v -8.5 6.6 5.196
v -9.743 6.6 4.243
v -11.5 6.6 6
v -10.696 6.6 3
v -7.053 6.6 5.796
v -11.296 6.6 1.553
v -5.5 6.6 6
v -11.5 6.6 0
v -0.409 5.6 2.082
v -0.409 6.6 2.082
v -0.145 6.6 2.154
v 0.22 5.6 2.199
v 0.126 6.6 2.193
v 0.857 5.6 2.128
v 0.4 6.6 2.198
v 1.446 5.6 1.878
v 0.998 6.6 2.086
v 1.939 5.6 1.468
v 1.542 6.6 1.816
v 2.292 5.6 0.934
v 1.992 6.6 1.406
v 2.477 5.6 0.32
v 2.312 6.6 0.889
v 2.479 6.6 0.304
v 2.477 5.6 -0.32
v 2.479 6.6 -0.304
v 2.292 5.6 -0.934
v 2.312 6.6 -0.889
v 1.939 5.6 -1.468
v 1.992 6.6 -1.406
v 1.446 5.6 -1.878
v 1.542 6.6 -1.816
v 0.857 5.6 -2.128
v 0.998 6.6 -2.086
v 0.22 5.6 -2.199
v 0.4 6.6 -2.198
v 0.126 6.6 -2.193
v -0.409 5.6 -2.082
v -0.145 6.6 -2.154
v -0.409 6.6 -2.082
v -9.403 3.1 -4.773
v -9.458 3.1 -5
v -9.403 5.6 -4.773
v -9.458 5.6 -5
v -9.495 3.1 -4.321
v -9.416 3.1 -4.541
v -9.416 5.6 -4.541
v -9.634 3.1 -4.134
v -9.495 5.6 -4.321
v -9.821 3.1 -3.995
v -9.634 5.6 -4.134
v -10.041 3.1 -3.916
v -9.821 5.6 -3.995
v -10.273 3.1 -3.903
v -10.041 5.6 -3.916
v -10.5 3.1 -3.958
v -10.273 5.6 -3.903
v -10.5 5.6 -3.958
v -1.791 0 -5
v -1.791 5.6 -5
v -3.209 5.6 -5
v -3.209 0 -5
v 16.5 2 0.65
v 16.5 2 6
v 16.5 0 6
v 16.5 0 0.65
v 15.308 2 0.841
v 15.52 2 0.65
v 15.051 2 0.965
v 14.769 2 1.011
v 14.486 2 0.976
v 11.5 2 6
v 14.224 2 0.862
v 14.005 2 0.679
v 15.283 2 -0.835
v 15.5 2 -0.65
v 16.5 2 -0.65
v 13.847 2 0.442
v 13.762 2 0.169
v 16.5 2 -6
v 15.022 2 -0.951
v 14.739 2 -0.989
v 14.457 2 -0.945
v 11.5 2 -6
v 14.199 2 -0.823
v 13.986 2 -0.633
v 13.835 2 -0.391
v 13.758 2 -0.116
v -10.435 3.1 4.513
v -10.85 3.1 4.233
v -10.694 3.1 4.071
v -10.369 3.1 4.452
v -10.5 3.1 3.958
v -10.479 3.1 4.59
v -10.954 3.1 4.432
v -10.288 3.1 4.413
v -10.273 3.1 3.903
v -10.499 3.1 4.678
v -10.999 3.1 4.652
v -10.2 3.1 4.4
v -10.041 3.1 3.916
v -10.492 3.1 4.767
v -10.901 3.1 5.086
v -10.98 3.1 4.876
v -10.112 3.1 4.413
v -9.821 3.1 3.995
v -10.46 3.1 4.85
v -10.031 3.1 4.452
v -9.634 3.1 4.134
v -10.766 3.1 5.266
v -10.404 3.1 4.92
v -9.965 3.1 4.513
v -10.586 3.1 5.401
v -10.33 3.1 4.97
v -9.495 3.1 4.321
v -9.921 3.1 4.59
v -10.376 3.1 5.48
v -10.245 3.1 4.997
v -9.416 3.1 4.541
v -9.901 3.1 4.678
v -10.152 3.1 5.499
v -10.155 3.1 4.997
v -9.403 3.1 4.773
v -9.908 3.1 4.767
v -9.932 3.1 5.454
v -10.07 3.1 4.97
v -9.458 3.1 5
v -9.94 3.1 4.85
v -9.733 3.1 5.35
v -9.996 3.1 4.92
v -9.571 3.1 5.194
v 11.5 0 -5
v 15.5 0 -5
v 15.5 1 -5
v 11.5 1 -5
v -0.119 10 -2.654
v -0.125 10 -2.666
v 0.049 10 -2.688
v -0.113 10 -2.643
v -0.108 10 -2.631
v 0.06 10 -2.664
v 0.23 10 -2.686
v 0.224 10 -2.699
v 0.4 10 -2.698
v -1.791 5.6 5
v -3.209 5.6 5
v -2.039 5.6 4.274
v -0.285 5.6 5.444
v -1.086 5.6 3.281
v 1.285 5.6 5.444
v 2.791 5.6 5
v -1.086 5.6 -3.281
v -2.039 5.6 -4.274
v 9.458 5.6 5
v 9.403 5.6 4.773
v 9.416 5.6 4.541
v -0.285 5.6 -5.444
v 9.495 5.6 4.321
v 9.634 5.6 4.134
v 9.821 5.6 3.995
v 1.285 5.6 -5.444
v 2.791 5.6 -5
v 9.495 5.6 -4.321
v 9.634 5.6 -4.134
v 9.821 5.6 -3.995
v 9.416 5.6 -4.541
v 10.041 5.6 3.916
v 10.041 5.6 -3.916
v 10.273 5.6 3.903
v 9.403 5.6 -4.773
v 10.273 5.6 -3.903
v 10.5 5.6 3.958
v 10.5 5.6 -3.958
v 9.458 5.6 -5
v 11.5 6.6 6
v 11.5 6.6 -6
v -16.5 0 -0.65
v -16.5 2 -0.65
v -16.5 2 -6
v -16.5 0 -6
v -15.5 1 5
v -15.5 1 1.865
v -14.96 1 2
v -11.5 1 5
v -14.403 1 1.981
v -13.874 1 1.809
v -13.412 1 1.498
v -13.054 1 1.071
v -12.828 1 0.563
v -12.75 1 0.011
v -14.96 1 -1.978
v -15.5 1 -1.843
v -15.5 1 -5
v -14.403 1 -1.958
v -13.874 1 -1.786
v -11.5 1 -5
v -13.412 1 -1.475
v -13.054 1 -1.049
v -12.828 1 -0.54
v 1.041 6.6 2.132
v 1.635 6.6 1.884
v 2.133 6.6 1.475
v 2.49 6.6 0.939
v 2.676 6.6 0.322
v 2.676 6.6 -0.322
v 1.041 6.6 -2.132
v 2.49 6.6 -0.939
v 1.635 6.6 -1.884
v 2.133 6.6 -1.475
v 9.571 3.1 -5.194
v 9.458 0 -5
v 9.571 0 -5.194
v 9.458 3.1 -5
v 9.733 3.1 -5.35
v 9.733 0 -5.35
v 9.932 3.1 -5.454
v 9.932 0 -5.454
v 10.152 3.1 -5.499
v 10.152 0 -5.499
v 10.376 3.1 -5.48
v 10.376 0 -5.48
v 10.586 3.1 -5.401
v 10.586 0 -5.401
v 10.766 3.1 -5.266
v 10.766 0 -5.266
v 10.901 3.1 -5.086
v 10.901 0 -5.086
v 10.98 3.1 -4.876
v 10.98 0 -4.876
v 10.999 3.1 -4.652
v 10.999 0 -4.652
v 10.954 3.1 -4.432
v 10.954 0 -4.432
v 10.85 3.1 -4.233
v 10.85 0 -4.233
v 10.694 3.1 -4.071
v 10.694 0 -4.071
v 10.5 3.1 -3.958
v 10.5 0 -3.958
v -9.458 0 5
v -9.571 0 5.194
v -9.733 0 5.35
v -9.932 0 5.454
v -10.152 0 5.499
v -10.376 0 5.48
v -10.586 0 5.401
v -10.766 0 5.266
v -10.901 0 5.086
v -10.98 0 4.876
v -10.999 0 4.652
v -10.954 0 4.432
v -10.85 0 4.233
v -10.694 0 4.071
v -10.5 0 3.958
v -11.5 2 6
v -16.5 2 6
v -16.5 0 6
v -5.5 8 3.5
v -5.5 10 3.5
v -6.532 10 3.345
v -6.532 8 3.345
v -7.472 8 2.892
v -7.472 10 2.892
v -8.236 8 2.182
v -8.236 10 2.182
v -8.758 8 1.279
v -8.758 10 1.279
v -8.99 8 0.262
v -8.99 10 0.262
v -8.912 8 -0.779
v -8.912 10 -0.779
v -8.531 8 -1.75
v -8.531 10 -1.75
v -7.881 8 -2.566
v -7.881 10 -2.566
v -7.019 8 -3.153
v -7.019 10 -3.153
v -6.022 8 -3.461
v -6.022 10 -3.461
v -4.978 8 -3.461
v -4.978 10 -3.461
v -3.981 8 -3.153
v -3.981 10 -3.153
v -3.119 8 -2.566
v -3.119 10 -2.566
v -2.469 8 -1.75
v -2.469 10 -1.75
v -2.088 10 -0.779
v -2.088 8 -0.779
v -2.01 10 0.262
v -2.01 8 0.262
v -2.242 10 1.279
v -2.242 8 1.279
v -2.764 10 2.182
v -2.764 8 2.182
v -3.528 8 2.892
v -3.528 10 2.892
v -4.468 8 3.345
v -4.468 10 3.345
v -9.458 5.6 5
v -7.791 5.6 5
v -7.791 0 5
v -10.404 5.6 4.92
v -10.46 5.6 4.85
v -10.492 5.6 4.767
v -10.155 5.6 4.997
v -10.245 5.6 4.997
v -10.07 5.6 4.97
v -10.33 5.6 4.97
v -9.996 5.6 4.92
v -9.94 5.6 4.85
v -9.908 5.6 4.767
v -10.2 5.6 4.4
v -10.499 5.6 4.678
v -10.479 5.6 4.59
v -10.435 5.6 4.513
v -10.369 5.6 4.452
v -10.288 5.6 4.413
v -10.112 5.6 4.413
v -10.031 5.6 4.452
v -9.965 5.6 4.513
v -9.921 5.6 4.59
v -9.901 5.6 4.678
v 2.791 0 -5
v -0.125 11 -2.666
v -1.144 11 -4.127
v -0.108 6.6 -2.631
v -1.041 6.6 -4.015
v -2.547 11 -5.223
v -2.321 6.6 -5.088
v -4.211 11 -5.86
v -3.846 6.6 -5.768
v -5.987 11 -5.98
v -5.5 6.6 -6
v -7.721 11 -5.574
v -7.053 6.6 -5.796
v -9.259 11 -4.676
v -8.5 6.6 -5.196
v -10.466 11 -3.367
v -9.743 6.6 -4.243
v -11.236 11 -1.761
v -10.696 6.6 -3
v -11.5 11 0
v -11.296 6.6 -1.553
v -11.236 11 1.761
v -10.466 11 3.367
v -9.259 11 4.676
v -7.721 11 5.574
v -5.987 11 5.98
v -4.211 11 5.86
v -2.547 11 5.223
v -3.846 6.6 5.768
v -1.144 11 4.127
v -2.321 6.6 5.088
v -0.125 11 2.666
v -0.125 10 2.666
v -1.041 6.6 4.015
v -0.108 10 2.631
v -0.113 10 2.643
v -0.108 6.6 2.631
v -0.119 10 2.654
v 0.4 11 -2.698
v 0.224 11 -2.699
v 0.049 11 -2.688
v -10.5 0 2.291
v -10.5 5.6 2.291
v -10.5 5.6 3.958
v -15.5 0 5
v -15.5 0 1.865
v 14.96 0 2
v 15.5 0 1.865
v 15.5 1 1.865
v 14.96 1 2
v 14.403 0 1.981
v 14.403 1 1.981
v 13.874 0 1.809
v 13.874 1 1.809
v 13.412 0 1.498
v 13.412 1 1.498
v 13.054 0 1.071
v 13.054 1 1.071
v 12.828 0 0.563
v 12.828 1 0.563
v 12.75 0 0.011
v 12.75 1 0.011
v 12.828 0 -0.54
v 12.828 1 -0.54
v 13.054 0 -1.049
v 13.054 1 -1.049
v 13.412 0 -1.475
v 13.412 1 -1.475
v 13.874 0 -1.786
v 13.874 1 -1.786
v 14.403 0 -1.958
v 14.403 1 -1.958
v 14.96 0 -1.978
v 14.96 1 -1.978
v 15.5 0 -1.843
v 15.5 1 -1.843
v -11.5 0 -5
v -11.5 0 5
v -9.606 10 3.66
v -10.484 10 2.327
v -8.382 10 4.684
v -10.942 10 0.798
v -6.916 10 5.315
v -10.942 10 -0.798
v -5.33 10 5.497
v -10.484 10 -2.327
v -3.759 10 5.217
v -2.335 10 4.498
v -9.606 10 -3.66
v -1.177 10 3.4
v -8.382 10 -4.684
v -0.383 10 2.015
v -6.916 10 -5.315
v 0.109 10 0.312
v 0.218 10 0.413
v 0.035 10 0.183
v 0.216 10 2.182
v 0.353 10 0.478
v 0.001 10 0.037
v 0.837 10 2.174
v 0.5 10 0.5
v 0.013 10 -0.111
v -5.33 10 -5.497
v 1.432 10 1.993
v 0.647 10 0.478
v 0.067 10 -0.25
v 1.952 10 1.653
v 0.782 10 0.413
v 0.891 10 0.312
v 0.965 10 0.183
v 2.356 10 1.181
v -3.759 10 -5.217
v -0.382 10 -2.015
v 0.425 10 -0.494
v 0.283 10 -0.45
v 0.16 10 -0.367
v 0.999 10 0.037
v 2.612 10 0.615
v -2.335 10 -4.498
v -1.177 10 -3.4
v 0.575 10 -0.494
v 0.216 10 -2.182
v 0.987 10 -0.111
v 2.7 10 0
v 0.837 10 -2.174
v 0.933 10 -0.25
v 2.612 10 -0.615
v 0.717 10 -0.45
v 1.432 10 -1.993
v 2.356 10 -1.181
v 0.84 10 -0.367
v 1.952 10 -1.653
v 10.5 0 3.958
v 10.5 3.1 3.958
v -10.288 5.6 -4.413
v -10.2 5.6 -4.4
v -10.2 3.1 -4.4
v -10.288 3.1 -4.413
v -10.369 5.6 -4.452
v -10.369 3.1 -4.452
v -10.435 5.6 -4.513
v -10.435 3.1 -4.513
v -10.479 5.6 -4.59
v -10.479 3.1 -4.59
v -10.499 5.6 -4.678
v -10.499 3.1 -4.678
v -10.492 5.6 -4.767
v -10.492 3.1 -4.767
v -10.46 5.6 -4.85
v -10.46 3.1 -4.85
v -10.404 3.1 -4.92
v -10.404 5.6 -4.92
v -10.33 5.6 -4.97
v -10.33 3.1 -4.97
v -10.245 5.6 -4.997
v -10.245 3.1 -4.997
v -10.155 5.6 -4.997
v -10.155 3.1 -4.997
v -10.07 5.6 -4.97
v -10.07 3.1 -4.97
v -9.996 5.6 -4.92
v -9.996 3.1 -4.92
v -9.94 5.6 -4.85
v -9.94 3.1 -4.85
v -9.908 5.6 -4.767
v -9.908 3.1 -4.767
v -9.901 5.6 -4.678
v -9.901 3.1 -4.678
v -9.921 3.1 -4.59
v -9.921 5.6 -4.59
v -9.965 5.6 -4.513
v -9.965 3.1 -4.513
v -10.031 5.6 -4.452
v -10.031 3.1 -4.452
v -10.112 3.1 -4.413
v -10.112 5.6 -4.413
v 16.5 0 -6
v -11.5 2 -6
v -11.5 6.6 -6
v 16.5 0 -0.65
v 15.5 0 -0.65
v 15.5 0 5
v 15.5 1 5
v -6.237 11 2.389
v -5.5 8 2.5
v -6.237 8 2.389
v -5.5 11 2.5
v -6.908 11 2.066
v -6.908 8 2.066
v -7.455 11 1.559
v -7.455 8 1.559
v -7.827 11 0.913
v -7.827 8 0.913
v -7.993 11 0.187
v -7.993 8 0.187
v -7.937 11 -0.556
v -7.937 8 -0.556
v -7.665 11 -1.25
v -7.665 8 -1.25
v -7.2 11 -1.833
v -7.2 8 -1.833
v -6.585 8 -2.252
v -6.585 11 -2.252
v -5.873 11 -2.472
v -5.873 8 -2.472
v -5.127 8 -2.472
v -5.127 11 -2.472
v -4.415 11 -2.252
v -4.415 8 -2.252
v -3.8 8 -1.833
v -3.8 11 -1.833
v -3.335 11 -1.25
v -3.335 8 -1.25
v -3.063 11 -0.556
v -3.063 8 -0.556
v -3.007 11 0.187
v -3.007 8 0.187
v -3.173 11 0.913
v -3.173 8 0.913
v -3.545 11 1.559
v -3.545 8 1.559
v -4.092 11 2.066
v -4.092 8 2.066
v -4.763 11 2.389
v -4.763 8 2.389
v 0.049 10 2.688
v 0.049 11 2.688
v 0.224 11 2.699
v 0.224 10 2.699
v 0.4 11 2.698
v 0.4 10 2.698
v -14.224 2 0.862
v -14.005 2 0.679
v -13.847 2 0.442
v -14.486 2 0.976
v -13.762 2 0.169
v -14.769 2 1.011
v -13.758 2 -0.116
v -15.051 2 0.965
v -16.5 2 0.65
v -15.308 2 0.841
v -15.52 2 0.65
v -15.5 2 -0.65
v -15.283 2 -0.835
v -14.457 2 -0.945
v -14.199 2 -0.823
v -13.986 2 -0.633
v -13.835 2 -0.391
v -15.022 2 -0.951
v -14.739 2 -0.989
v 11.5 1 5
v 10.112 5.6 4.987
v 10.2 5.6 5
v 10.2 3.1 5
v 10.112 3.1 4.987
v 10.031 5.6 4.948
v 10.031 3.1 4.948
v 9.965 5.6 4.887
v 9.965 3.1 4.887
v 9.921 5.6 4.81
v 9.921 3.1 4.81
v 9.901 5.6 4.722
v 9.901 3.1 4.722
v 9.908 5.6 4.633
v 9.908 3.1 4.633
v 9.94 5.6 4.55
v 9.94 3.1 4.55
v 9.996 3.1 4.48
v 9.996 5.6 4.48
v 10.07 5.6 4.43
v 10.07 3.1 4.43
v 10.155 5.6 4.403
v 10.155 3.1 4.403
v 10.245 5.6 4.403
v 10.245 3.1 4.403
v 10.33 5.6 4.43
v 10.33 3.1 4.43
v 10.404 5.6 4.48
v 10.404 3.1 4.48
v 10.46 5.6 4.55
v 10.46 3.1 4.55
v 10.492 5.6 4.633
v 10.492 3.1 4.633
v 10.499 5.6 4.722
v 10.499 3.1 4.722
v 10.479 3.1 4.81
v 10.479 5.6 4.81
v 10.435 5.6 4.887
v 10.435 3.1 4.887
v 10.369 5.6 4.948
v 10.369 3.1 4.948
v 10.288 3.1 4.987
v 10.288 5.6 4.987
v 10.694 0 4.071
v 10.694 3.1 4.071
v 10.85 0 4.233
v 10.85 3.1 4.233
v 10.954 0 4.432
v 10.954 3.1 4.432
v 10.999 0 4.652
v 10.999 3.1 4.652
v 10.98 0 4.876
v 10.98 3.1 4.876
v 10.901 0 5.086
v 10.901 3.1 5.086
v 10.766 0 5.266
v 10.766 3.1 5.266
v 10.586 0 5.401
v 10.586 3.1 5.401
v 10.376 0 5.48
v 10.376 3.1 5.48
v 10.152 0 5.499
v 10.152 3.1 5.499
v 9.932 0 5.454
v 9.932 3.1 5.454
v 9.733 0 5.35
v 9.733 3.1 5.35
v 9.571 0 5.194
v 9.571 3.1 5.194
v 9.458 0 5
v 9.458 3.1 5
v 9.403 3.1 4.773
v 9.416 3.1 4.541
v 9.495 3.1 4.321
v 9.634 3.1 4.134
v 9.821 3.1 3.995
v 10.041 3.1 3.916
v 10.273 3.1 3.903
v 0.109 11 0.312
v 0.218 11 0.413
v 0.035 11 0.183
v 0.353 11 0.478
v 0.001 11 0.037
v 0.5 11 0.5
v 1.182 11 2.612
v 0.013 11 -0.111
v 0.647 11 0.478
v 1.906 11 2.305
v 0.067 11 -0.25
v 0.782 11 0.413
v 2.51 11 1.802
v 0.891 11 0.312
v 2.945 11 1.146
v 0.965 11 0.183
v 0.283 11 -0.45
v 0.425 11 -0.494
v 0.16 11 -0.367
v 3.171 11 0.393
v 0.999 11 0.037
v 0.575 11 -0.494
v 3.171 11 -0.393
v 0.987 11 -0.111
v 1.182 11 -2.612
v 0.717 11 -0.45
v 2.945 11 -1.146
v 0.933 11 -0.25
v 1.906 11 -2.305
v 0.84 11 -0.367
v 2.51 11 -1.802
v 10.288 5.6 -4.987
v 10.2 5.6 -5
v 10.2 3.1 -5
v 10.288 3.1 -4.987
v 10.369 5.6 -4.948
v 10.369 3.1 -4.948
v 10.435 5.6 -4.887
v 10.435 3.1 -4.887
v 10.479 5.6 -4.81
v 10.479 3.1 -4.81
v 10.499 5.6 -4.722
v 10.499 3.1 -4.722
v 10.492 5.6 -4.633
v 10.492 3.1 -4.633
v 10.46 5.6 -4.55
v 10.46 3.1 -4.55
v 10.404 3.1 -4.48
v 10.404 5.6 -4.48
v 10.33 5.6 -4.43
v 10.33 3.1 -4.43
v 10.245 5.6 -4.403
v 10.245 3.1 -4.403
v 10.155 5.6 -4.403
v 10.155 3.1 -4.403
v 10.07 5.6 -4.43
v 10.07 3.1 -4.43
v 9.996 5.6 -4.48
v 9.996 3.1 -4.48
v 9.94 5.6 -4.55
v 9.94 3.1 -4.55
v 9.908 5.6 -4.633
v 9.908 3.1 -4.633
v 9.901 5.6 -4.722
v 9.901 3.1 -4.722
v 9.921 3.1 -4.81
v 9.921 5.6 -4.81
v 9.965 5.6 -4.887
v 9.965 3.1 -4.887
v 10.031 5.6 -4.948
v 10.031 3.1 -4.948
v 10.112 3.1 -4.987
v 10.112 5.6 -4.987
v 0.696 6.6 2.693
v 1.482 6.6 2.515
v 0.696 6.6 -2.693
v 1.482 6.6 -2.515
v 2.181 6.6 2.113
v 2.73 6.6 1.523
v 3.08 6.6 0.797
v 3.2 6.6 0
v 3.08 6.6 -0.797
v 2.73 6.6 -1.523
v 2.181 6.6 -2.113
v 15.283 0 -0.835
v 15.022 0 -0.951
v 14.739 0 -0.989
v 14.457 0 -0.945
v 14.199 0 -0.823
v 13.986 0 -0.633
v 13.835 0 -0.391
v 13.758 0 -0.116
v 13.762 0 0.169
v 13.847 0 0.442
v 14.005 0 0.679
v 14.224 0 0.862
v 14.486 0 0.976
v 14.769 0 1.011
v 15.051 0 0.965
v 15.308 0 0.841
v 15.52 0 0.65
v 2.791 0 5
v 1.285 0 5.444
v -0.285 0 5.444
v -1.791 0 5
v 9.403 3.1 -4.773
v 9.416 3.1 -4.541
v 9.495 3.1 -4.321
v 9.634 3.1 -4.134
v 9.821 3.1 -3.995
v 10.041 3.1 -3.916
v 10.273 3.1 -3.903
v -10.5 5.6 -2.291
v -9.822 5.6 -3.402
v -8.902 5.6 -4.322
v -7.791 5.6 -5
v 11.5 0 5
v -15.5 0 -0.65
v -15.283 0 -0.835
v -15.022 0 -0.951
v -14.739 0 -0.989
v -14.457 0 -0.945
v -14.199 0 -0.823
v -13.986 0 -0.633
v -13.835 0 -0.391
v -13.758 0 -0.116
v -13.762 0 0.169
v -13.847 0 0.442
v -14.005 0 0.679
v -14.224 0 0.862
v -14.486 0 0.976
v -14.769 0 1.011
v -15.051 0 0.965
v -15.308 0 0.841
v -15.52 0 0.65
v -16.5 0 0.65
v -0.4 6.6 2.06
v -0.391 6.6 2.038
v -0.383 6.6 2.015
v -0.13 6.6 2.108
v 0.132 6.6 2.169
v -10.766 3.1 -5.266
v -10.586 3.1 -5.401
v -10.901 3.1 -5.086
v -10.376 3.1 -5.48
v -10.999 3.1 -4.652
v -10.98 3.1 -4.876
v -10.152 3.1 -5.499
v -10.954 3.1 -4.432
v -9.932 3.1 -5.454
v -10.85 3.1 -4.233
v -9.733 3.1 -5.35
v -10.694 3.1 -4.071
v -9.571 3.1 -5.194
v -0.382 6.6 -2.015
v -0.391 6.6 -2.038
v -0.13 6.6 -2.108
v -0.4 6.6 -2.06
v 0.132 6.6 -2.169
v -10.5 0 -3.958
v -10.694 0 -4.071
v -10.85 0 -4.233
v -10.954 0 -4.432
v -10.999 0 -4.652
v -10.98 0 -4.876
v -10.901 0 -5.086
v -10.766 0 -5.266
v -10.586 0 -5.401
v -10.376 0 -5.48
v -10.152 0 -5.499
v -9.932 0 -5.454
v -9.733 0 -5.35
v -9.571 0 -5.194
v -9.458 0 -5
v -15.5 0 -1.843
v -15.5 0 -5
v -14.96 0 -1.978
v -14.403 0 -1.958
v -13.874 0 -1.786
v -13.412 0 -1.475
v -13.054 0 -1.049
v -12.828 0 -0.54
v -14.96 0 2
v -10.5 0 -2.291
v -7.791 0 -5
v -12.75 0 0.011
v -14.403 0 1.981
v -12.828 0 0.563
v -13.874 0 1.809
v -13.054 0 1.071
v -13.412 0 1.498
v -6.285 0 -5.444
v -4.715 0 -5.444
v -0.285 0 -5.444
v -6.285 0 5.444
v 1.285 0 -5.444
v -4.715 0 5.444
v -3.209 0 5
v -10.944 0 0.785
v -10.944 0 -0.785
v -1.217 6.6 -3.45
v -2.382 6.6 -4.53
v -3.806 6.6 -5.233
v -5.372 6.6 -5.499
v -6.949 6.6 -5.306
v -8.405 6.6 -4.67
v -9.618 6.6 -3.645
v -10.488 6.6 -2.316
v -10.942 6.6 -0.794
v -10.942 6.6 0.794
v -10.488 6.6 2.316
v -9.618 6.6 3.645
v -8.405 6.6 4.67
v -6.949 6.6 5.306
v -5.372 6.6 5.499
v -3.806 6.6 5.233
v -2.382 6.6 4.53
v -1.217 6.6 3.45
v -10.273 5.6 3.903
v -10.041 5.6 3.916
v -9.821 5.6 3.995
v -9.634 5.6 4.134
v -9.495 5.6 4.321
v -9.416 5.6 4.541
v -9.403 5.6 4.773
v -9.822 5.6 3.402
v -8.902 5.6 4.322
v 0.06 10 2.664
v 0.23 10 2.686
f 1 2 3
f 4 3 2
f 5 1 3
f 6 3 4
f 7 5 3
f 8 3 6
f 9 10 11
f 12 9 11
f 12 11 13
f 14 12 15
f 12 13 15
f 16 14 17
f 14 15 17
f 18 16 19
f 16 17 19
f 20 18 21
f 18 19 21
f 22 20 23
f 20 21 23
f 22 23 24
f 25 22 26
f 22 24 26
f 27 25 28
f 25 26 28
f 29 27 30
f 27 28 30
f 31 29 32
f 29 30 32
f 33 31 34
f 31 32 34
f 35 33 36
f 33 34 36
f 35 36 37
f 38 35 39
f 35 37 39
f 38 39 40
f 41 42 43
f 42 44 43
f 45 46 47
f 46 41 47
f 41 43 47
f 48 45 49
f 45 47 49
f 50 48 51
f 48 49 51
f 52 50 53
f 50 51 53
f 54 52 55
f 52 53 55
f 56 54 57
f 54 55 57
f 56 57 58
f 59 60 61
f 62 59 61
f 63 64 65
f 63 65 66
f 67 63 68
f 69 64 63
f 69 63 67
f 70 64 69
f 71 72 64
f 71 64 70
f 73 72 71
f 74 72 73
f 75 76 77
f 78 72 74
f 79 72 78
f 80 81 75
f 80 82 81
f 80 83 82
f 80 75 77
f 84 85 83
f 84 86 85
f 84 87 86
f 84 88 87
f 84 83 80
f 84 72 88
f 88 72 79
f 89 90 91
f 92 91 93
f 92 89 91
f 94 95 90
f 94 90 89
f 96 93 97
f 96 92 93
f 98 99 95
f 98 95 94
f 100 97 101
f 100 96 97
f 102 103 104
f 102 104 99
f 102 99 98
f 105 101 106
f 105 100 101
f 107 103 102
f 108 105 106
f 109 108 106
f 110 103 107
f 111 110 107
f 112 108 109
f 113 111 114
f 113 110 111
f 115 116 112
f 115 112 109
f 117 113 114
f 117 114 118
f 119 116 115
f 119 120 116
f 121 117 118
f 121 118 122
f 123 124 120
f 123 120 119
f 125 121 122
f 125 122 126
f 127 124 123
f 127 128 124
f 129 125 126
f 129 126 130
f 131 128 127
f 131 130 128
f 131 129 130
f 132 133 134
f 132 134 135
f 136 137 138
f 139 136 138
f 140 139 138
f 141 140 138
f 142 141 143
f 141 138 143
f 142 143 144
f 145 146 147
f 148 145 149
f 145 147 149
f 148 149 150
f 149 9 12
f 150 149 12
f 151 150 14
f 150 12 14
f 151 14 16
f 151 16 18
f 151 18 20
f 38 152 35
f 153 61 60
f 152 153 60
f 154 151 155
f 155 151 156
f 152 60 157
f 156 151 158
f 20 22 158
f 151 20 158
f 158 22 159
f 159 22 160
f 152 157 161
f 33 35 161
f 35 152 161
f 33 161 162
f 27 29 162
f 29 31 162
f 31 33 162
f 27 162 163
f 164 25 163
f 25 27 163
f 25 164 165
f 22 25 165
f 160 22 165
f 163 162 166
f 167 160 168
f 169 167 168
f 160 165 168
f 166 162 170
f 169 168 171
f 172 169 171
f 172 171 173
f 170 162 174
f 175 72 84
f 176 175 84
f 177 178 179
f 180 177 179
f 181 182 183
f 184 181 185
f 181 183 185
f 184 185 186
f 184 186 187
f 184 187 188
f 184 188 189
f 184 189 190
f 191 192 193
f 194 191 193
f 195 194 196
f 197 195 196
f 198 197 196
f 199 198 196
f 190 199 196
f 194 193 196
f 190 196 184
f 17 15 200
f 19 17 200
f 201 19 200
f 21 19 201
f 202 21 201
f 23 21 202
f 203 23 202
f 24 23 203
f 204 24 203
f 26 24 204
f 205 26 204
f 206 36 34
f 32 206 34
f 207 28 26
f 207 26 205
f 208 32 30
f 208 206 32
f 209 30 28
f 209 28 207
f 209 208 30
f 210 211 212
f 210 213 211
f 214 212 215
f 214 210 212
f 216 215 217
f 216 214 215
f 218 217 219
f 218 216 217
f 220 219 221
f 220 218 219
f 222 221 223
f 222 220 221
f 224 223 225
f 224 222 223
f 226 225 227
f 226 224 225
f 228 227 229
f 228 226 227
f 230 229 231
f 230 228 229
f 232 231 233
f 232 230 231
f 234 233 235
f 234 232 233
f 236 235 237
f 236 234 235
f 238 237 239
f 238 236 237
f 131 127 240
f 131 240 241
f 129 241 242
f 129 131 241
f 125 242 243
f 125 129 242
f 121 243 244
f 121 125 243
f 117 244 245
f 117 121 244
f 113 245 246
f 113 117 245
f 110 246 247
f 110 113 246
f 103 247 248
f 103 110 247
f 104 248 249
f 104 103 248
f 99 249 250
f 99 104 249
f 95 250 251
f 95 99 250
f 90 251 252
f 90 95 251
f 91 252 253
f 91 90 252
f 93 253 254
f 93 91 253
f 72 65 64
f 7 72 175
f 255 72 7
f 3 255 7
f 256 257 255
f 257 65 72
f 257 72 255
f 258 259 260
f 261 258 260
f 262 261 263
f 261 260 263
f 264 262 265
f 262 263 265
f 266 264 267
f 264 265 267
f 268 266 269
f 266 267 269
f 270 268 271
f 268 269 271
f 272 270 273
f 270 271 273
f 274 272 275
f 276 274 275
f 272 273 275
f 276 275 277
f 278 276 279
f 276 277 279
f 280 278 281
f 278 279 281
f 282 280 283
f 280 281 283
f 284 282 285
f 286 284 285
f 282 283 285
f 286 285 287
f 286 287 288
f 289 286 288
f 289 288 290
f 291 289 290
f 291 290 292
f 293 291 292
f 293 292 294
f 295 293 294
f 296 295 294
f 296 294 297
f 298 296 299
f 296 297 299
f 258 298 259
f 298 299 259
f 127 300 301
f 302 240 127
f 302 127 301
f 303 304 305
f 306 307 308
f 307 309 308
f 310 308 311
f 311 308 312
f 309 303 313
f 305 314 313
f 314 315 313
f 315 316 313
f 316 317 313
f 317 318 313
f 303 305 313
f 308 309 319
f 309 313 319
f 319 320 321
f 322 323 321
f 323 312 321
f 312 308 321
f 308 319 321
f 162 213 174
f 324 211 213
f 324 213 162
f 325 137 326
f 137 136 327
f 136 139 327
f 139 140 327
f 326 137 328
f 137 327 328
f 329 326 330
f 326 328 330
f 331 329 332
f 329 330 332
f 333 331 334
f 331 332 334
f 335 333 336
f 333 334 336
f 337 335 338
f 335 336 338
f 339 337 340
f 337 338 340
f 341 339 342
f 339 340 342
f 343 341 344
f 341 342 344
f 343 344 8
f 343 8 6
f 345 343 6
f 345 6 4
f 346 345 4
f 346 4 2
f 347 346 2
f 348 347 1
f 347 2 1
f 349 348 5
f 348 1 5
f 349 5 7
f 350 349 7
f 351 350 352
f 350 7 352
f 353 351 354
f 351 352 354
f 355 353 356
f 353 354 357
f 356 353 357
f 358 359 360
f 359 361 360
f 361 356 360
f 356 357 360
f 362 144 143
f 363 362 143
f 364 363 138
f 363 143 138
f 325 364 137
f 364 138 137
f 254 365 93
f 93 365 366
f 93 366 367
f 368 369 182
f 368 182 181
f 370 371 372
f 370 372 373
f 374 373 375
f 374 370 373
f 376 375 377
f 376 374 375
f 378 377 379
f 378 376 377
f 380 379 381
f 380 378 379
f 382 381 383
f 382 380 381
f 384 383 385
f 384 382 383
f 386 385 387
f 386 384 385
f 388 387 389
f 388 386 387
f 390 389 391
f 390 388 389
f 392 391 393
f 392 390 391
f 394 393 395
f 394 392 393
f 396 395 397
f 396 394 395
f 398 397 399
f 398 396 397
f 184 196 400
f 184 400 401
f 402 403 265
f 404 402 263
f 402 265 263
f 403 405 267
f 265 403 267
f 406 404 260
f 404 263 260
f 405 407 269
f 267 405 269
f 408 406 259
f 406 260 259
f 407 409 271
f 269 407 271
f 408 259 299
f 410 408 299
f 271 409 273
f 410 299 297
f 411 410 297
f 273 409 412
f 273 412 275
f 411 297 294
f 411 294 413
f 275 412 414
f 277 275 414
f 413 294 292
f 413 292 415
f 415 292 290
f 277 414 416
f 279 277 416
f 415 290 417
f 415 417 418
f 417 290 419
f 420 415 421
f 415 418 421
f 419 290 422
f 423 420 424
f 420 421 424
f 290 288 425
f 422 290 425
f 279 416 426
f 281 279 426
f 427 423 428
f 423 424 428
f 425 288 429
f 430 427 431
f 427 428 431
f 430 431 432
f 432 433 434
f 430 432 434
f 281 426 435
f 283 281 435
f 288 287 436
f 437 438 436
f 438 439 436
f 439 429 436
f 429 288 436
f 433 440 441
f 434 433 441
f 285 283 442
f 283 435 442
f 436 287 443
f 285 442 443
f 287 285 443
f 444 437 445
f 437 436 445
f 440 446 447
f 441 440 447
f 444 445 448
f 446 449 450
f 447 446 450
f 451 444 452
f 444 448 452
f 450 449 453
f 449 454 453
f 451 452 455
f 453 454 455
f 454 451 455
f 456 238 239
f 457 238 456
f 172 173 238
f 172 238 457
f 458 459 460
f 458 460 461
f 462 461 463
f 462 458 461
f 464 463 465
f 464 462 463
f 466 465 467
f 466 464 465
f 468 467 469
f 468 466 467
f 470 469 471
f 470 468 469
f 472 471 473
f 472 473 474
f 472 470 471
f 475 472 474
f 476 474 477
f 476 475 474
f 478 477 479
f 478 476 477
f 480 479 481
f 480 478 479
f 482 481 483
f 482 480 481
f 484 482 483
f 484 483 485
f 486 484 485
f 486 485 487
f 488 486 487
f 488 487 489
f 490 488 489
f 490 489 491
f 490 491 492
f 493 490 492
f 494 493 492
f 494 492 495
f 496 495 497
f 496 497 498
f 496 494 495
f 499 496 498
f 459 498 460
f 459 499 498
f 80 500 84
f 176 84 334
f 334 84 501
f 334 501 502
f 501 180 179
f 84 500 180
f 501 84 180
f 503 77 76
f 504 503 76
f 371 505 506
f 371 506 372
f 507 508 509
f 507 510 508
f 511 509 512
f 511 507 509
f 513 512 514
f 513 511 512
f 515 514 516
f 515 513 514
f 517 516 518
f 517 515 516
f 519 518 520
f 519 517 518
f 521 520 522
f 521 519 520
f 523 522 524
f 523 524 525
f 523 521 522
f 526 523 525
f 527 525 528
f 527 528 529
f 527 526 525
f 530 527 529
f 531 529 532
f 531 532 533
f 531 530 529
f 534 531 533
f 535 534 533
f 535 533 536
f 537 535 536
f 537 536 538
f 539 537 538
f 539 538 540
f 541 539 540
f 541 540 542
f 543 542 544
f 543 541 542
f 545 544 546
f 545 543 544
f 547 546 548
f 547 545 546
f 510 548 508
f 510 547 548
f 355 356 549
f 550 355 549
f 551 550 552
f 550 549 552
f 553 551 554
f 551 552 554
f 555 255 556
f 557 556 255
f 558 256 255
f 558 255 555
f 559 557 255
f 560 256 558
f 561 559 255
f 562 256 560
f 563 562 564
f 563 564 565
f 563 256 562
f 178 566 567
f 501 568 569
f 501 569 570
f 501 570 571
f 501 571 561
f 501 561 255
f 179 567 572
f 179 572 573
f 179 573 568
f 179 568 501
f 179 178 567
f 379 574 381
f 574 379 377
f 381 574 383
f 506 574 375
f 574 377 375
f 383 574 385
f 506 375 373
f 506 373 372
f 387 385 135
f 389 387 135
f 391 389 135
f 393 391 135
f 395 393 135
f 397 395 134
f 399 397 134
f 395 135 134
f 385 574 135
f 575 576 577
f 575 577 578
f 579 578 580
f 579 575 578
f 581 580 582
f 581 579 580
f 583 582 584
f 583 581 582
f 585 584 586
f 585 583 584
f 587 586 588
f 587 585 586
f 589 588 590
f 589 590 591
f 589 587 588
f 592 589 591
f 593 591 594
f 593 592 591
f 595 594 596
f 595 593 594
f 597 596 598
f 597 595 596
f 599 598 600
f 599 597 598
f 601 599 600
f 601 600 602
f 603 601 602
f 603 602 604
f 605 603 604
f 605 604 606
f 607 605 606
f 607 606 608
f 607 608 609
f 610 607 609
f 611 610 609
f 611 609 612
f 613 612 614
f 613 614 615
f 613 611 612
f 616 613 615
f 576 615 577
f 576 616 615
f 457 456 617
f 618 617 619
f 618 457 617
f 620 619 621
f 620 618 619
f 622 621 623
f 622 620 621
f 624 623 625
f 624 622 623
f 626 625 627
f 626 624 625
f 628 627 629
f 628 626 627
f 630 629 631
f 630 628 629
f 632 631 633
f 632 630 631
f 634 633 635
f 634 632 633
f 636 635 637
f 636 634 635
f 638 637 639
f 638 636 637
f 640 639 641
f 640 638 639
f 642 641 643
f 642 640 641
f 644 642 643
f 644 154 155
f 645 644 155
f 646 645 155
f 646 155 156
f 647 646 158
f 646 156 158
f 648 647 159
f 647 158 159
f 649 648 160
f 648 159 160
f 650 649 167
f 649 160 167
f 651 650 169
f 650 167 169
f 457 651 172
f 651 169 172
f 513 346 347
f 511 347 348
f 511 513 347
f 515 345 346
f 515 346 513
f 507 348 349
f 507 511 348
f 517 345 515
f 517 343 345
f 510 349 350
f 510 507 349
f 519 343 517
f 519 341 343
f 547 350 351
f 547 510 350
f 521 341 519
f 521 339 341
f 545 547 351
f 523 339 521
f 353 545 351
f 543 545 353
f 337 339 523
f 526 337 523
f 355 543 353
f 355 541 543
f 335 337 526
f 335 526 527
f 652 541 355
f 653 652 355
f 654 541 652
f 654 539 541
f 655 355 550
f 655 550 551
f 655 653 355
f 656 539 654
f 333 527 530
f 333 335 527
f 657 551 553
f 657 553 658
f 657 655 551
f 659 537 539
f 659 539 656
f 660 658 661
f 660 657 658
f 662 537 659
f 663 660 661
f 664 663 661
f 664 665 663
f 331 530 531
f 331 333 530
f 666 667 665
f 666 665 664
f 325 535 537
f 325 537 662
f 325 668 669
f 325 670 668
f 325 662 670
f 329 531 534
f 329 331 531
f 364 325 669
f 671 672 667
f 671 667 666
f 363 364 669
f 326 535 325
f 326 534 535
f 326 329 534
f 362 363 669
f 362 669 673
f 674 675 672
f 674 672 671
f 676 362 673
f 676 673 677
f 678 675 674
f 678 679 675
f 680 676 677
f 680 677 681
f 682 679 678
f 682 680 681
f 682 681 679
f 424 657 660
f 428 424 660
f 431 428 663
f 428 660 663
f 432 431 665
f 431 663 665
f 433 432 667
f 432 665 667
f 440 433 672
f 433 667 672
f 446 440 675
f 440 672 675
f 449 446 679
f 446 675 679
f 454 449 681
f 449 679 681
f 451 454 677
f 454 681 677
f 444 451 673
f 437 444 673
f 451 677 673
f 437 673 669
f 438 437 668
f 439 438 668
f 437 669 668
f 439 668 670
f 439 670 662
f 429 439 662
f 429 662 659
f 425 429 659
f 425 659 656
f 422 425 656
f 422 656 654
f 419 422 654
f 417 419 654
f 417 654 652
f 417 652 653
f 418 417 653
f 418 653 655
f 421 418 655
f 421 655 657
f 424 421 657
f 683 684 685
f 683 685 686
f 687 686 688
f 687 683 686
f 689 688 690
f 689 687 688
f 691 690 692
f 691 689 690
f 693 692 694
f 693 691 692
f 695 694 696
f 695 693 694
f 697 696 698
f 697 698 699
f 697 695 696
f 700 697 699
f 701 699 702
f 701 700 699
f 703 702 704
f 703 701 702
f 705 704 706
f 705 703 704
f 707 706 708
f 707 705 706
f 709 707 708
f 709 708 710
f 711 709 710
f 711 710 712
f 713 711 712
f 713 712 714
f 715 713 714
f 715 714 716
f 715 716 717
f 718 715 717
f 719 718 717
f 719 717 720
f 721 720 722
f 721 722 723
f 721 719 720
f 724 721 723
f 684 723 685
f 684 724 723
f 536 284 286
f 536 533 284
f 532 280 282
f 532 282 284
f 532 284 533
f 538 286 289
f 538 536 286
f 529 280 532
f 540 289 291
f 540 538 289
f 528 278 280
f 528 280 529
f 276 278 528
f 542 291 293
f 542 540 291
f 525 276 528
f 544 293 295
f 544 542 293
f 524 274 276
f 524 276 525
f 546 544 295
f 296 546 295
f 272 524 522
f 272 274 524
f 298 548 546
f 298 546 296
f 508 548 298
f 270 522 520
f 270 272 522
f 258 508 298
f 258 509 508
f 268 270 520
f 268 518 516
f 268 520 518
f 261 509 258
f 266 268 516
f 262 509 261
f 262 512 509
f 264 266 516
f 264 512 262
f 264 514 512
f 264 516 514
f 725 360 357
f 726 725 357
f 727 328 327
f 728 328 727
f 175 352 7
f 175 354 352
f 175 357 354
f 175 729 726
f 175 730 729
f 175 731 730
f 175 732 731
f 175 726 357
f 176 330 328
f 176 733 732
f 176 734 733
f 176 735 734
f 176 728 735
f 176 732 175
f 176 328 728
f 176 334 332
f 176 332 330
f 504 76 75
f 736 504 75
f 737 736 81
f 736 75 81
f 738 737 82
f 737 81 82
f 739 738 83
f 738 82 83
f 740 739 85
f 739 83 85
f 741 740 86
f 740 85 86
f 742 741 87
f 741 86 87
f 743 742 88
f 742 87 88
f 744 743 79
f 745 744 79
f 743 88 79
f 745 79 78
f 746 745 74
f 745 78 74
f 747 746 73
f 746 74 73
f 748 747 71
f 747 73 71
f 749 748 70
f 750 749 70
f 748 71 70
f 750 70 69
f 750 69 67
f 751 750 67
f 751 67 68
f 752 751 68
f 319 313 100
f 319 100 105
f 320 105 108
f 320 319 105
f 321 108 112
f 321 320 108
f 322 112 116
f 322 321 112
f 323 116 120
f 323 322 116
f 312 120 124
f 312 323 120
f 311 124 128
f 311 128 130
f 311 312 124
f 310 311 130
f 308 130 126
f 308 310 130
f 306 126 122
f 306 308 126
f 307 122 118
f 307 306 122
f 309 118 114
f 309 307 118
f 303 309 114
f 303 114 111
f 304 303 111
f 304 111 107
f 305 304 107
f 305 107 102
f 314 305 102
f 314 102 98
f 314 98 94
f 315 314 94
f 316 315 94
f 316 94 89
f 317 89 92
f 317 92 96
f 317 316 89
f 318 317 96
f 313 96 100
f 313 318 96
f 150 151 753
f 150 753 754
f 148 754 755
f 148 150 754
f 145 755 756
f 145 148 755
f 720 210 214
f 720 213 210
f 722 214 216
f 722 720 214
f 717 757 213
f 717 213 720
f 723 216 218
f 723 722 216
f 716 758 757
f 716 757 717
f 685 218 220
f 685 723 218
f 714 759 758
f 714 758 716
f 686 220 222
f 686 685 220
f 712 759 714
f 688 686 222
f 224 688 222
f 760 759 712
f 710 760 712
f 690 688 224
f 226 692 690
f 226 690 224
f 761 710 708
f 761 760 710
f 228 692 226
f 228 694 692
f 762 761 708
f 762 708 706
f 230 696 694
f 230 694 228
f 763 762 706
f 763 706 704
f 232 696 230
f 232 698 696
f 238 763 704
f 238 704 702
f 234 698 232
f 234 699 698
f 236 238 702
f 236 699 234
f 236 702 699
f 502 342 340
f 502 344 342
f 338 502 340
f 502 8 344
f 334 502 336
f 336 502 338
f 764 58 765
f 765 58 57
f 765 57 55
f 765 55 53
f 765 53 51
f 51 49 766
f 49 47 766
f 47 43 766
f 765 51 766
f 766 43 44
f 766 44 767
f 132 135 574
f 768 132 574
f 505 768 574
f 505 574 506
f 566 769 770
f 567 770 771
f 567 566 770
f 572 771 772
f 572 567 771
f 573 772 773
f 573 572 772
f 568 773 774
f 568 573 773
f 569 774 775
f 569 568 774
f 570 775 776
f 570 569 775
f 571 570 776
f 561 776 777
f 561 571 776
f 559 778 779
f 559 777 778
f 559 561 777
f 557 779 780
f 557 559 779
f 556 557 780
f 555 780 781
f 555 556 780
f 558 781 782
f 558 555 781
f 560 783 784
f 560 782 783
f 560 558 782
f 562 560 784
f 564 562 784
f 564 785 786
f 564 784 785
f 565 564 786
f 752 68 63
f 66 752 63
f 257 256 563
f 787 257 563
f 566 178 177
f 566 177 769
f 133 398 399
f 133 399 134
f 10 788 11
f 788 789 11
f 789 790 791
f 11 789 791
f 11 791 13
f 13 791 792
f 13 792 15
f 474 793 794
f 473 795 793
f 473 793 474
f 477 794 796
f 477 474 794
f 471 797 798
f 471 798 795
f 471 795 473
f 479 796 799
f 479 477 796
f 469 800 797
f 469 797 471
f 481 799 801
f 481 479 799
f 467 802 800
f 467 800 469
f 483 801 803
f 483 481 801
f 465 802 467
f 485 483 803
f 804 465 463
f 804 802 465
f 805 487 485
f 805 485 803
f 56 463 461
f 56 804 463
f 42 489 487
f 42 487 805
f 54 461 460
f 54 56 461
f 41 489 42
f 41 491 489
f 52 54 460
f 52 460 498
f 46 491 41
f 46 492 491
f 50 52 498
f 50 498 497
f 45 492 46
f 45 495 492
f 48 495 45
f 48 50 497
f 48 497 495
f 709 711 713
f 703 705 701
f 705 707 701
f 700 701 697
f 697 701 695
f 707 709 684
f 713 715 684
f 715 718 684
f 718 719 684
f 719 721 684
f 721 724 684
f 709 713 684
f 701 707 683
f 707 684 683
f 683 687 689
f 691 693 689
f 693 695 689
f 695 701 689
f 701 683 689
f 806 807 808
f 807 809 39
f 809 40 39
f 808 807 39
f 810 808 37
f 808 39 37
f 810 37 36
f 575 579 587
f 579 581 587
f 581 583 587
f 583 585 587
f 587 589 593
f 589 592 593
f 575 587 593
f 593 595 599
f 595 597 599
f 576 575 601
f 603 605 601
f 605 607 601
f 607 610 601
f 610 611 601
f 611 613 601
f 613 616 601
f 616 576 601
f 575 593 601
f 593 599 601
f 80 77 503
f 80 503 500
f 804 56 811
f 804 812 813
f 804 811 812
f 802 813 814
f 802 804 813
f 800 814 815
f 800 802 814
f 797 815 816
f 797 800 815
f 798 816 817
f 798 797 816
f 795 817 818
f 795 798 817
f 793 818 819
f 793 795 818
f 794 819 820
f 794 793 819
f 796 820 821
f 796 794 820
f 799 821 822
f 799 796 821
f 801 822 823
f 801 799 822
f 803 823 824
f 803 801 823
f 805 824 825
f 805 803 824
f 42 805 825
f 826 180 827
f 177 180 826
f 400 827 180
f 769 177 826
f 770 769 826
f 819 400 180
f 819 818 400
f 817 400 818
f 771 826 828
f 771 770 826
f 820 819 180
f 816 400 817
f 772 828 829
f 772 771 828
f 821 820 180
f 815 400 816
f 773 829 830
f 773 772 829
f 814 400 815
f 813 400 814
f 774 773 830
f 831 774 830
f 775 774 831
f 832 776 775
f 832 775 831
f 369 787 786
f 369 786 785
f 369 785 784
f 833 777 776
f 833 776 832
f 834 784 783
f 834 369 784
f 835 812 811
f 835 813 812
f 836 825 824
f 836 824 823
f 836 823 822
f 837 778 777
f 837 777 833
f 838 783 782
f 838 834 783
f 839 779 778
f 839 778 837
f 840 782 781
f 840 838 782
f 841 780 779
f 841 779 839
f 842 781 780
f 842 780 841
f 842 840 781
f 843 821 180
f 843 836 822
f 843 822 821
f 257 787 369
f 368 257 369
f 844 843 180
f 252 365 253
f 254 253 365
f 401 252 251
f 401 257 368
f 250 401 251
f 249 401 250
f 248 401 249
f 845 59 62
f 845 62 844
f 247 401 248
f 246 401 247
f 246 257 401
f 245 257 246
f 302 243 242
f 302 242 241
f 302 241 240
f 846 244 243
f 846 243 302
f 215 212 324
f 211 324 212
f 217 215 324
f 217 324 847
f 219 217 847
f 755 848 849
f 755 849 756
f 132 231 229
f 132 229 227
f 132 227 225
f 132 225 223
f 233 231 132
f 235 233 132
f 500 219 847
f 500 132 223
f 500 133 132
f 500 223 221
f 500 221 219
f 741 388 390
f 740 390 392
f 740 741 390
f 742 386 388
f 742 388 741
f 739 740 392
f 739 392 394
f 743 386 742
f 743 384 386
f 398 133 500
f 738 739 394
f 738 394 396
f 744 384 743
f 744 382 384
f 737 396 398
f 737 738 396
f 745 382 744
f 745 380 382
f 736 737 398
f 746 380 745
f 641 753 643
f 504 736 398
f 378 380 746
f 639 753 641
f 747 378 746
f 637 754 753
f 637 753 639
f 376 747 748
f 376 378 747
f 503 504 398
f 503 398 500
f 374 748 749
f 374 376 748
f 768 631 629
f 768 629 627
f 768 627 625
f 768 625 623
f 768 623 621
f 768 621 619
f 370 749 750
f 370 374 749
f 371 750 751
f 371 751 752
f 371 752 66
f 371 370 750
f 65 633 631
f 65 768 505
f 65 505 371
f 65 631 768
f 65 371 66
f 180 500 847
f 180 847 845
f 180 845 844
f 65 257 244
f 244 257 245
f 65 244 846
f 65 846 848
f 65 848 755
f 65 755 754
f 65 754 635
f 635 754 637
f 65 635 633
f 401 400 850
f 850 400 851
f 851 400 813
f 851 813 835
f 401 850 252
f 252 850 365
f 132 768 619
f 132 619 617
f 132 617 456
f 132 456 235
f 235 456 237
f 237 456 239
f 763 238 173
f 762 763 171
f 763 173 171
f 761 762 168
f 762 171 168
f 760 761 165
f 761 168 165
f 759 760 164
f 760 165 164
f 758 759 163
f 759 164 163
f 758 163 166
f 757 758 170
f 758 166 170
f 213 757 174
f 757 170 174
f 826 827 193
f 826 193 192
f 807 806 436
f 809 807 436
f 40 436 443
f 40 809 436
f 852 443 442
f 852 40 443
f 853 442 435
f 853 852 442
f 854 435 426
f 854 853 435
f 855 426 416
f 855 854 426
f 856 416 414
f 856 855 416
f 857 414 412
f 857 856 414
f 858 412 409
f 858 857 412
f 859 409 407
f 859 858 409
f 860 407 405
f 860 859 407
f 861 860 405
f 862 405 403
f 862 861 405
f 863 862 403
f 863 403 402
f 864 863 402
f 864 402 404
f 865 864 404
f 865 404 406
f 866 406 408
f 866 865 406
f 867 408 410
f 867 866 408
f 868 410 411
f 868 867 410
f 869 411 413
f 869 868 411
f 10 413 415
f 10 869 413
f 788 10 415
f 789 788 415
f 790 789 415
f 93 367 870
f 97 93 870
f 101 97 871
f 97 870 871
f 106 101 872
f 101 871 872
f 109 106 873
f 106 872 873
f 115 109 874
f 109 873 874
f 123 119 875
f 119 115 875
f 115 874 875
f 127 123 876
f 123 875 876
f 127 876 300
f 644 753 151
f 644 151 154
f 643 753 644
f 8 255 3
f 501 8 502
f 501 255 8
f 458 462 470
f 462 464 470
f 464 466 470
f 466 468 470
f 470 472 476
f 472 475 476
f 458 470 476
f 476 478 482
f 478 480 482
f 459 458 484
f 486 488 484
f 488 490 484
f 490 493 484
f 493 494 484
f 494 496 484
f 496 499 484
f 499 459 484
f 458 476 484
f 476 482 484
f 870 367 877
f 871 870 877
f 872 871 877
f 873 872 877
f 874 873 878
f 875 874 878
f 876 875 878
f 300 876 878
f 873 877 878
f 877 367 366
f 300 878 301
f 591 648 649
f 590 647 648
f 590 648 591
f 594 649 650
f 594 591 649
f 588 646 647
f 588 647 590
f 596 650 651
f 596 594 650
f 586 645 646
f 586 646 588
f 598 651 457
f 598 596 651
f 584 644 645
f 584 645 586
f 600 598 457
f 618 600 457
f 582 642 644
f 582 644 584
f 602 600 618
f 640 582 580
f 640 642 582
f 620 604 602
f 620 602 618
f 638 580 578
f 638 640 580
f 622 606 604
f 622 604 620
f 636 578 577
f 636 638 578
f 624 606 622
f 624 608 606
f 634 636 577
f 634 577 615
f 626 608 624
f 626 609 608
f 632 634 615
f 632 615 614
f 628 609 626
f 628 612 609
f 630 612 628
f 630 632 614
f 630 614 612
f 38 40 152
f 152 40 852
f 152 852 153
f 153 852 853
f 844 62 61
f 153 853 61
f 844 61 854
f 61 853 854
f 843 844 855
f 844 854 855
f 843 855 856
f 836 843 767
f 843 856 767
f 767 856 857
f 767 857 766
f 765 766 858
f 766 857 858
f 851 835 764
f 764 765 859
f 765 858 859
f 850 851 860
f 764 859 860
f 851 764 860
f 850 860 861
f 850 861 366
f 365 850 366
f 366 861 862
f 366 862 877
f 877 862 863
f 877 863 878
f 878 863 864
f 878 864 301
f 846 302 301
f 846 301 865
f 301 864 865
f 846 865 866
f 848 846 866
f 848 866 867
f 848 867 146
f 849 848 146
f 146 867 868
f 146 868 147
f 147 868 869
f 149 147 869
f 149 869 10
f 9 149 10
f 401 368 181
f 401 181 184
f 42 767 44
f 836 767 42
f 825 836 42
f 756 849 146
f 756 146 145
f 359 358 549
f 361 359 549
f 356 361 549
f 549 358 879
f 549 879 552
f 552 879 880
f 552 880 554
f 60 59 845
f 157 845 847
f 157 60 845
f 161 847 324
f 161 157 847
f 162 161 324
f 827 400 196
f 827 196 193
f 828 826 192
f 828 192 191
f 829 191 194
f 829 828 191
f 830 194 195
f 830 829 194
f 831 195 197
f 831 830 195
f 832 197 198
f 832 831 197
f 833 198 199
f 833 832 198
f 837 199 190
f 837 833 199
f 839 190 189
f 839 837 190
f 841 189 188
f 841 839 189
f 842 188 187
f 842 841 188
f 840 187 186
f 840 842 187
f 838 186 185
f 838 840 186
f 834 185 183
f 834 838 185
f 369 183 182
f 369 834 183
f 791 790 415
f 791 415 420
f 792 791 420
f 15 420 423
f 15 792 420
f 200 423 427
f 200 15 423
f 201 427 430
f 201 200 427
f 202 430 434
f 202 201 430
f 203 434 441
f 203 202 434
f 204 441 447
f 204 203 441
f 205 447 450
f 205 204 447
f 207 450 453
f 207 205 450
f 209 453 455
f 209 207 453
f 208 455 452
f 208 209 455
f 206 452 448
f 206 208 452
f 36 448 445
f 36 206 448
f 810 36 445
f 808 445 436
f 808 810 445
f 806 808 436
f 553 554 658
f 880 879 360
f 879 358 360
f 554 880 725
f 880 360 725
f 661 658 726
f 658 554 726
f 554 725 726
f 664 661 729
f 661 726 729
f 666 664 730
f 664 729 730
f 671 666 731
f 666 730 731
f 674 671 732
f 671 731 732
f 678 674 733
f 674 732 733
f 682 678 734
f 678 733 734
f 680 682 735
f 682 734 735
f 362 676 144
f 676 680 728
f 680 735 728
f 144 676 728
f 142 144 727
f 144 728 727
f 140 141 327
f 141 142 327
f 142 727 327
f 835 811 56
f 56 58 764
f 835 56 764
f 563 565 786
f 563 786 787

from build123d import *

# Parameters (mm, degrees)
SKETCH1_W                = 23
SKETCH1_H                = 12
BOSS_EXTRUDE1_DEPTH      = 6.6
BOSS_EXTRUDE2_DEPTH      = 5
BOSS_EXTRUDE2_DEPTH_BACK = 28
SKETCH2_W                = 12
SKETCH2_H                = 2
CUT_EXTRUDE1_DEPTH       = 5
SHELL3_OUTLINE_W         = 21
SHELL3_OUTLINE_H         = 10
SHELL3_DEPTH             = 5.6
SHELL3_2_DEPTH           = 1
SKETCH5_W                = 1
SKETCH5_H                = 10
BOSS_EXTRUDE4_DEPTH      = 1
SKETCH5_3_W              = 1
SKETCH5_3_H              = 10
BOSS_EXTRUDE5_DEPTH      = 1
BOSS_EXTRUDE6_DEPTH      = 4.4
CUT_EXTRUDE2_DEPTH       = 19.756598839
BOSS_EXTRUDE7_START      = -1
BOSS_EXTRUDE7_DEPTH      = 1
SKETCH21_R               = 2.5
SKETCH21_R_2             = 0.5
CUT_EXTRUDE3_DEPTH       = 21.718349355
SKETCH22_R               = 5.5
SKETCH22_R_2             = 0.8
CUT_EXTRUDE4_DEPTH       = 19.42851052
SKETCH23_R               = 0.8
SKETCH23_R_2             = 0.3
BOSS_EXTRUDE9_DEPTH      = 2.5
SKETCH25_R               = 3.5
SKETCH25_R_2             = 2.5
BOSS_EXTRUDE10_DEPTH     = 2


# Read off the part's stored shape, not the designer's step: Shell3
with BuildPart() as part:
    # Sketch1 → Boss-Extrude1 (new body)
    with BuildSketch(Plane(origin=(0, 0, 0), x_dir=(1, 0, 0), z_dir=(0, 1, 0))):
        Rectangle(SKETCH1_W, SKETCH1_H)
    extrude(amount=BOSS_EXTRUDE1_DEPTH)

    # Sketch2 → Boss-Extrude2 (add, two sides: drawn at the far end of the back side and taken through both)
    with BuildSketch(Plane(origin=(11.5, 0, 0), x_dir=(0, 0, -1), z_dir=(1, 0, 0)).offset(-BOSS_EXTRUDE2_DEPTH_BACK)):
        with Locations((0, 1)):
            Rectangle(SKETCH2_W, SKETCH2_H)
    extrude(amount=BOSS_EXTRUDE2_DEPTH + BOSS_EXTRUDE2_DEPTH_BACK)

    # Sketch3 → Cut-Extrude1 (cut)
    with BuildSketch(Plane(origin=(0, 2, 0), x_dir=(1, 0, 0), z_dir=(0, 1, 0))):
        with BuildLine():
            Line((16.5, 0.65), (15.5, 0.65))
            ThreePointArc((15.5, 0.65), (13.750113293, -0.026490152), (15.519570239, -0.65))
            Line((15.519570239, -0.65), (16.5, -0.65))
            Line((16.5, -0.65), (16.5, 0.65))
        make_face()
        with BuildLine():
            Line((-16.5, -0.65), (-16.5, 0.65))
            Line((-16.5, 0.65), (-15.5, 0.65))
            ThreePointArc((-15.5, 0.65), (-13.750113293, -0.026490152), (-15.519570239, -0.65))
            Line((-15.519570239, -0.65), (-16.5, -0.65))
        make_face()
    extrude(amount=-CUT_EXTRUDE1_DEPTH, mode=Mode.SUBTRACT)

    # Shell3 outline → Shell3 (cut)
    with BuildSketch(Plane(origin=(0, 0, 0), x_dir=(1, 0, 0), z_dir=(0, 1, 0))):
        Rectangle(SHELL3_OUTLINE_W, SHELL3_OUTLINE_H)
    extrude(amount=SHELL3_DEPTH, mode=Mode.SUBTRACT)

    # Shell3 2 outline → Shell3 2 (cut)
    with BuildSketch(Plane(origin=(0, 0, 0), x_dir=(1, 0, 0), z_dir=(0, 1, 0))):
        with BuildLine():
            ThreePointArc((-15.5, 1.842611794), (-12.75, -0.011437828), (-15.5, -1.86548745))
            Line((-15.5, -1.86548745), (-15.5, -5))
            Line((-15.5, -5), (-10.5, -5))
            Line((-10.5, -5), (-10.5, 5))
            Line((-10.5, 5), (-15.5, 5))
            Line((-15.5, 5), (-15.5, 1.842611794))
        make_face()
        with BuildLine():
            Line((10.5, 5), (10.5, -5))
            Line((10.5, -5), (15.5, -5))
            Line((15.5, -5), (15.5, -1.86548745))
            ThreePointArc((15.5, -1.86548745), (12.75, -0.011437828), (15.5, 1.842611794))
            Line((15.5, 1.842611794), (15.5, 5))
            Line((15.5, 5), (10.5, 5))
        make_face()
    extrude(amount=SHELL3_2_DEPTH, mode=Mode.SUBTRACT)

    # Sketch5 → Boss-Extrude4 (add)
    with BuildSketch(Plane.XZ.offset(-1)):
        with Locations((11, 0)):
            Rectangle(SKETCH5_W, SKETCH5_H)
    extrude(amount=BOSS_EXTRUDE4_DEPTH)

    # Sketch5<3> → Boss-Extrude5 (add)
    with BuildSketch(Plane.XZ.offset(-1)):
        with Locations((11, 0)):
            Rectangle(SKETCH5_3_W, SKETCH5_3_H)
        with Locations((-11, 0)):
            Rectangle(SKETCH5_3_W, SKETCH5_3_H)
    extrude(amount=BOSS_EXTRUDE5_DEPTH)

    # Sketch7 → Boss-Extrude6 (add)
    with BuildSketch(Plane(origin=(0, 6.6, 0), x_dir=(1, 0, 0), z_dir=(0, 1, 0))):
        with BuildLine():
            ThreePointArc((-0.1075, 2.630768661), (-11.5, 0), (-0.1075, -2.630768661))
            ThreePointArc((-0.1075, -2.630768661), (3.2, 0), (-0.1075, 2.630768661))
        make_face()
        with BuildLine():
            ThreePointArc((-0.3825, -2.01524037), (2.7, 0), (-0.3825, 2.01524037))
            ThreePointArc((-0.3825, 2.01524037), (-11, 0), (-0.3825, -2.01524037))
        make_face(mode=Mode.SUBTRACT)
    extrude(amount=BOSS_EXTRUDE6_DEPTH)

    # Sketch19 → Cut-Extrude2 (cut, through all)
    with BuildSketch(Plane(origin=(0, 6.6, 0), x_dir=(1, 0, 0), z_dir=(0, 1, 0))):
        with BuildLine():
            ThreePointArc((-0.409482759, 2.082458695), (-11, 0), (-0.409482759, -2.082458695))
            ThreePointArc((-0.409482759, -2.082458695), (2.5, 0), (-0.409482759, 2.082458695))
        make_face()
    extrude(amount=-CUT_EXTRUDE2_DEPTH, mode=Mode.SUBTRACT)

    # Sketch20 → Boss-Extrude7 (add)
    with BuildSketch(Plane(origin=(0, 11, 0), x_dir=(1, 0, 0), z_dir=(0, 1, 0)).offset(BOSS_EXTRUDE7_START)):
        with BuildLine():
            ThreePointArc((-0.125, 2.666341126), (-11.5, 0), (-0.125, -2.666341126))
            ThreePointArc((-0.125, -2.666341126), (3, 0), (-0.125, 2.666341126))
        make_face()
    extrude(amount=BOSS_EXTRUDE7_DEPTH)

    # Sketch21 → Cut-Extrude3 (cut, through all)
    with BuildSketch(Plane(origin=(0, 11, 0), x_dir=(1, 0, 0), z_dir=(0, 1, 0))):
        with Locations(Location((-5.5, 0, 0), (0, 0, 270))):
            Circle(SKETCH21_R)
        with Locations(Location((0.5, 0, 0), (0, 0, 270))):
            Circle(SKETCH21_R_2)
    extrude(amount=-CUT_EXTRUDE3_DEPTH, mode=Mode.SUBTRACT)

    # Sketch22 → Cut-Extrude4 (cut, through all)
    with BuildSketch(Plane.XZ.offset(-5.6)):
        with Locations((0.5, 0)):
            Circle(SKETCH22_R)
        with Locations((-10.2, 4.7)):
            Circle(SKETCH22_R_2)
        with Locations((-10.2, -4.7)):
            Circle(SKETCH22_R_2)
        with Locations((10.2, -4.7)):
            Circle(SKETCH22_R_2)
        with Locations((10.2, 4.7)):
            Circle(SKETCH22_R_2)
    extrude(amount=CUT_EXTRUDE4_DEPTH, mode=Mode.SUBTRACT)

    # Sketch23 → Boss-Extrude9 (add)
    # profile 1 of 4: a face of its own
    with BuildSketch(Plane.XZ.offset(-5.6)):
        with Locations((-10.2, 4.7)):
            Circle(SKETCH23_R)
        with Locations(Location((-10.2, 4.7, 0), (0, 0, 270))):
            Circle(SKETCH23_R_2, mode=Mode.SUBTRACT)
    # profile 2 of 4: a face of its own
    with BuildSketch(Plane.XZ.offset(-5.6)):
        with Locations((-10.2, -4.7)):
            Circle(SKETCH23_R)
        with Locations(Location((-10.2, -4.7, 0), (0, 0, 90))):
            Circle(SKETCH23_R_2, mode=Mode.SUBTRACT)
    # profile 3 of 4: a face of its own
    with BuildSketch(Plane.XZ.offset(-5.6)):
        with Locations((10.2, -4.7)):
            Circle(SKETCH23_R)
        with Locations(Location((10.2, -4.7, 0), (0, 0, 270))):
            Circle(SKETCH23_R_2, mode=Mode.SUBTRACT)
    # profile 4 of 4: a face of its own
    with BuildSketch(Plane.XZ.offset(-5.6)):
        with Locations((10.2, 4.7)):
            Circle(SKETCH23_R)
        with Locations(Location((10.2, 4.7, 0), (0, 0, 90))):
            Circle(SKETCH23_R_2, mode=Mode.SUBTRACT)
    extrude(amount=BOSS_EXTRUDE9_DEPTH)

    # Sketch25 → Boss-Extrude10 (add)
    with BuildSketch(Plane.XZ.offset(-10)):
        with Locations(Location((-5.5, 0, 0), (0, 0, 90))):
            Circle(SKETCH25_R)
        with Locations(Location((-5.5, 0, 0), (0, 0, 90))):
            Circle(SKETCH25_R_2, mode=Mode.SUBTRACT)
    extrude(amount=BOSS_EXTRUDE10_DEPTH)


solid = part.part
